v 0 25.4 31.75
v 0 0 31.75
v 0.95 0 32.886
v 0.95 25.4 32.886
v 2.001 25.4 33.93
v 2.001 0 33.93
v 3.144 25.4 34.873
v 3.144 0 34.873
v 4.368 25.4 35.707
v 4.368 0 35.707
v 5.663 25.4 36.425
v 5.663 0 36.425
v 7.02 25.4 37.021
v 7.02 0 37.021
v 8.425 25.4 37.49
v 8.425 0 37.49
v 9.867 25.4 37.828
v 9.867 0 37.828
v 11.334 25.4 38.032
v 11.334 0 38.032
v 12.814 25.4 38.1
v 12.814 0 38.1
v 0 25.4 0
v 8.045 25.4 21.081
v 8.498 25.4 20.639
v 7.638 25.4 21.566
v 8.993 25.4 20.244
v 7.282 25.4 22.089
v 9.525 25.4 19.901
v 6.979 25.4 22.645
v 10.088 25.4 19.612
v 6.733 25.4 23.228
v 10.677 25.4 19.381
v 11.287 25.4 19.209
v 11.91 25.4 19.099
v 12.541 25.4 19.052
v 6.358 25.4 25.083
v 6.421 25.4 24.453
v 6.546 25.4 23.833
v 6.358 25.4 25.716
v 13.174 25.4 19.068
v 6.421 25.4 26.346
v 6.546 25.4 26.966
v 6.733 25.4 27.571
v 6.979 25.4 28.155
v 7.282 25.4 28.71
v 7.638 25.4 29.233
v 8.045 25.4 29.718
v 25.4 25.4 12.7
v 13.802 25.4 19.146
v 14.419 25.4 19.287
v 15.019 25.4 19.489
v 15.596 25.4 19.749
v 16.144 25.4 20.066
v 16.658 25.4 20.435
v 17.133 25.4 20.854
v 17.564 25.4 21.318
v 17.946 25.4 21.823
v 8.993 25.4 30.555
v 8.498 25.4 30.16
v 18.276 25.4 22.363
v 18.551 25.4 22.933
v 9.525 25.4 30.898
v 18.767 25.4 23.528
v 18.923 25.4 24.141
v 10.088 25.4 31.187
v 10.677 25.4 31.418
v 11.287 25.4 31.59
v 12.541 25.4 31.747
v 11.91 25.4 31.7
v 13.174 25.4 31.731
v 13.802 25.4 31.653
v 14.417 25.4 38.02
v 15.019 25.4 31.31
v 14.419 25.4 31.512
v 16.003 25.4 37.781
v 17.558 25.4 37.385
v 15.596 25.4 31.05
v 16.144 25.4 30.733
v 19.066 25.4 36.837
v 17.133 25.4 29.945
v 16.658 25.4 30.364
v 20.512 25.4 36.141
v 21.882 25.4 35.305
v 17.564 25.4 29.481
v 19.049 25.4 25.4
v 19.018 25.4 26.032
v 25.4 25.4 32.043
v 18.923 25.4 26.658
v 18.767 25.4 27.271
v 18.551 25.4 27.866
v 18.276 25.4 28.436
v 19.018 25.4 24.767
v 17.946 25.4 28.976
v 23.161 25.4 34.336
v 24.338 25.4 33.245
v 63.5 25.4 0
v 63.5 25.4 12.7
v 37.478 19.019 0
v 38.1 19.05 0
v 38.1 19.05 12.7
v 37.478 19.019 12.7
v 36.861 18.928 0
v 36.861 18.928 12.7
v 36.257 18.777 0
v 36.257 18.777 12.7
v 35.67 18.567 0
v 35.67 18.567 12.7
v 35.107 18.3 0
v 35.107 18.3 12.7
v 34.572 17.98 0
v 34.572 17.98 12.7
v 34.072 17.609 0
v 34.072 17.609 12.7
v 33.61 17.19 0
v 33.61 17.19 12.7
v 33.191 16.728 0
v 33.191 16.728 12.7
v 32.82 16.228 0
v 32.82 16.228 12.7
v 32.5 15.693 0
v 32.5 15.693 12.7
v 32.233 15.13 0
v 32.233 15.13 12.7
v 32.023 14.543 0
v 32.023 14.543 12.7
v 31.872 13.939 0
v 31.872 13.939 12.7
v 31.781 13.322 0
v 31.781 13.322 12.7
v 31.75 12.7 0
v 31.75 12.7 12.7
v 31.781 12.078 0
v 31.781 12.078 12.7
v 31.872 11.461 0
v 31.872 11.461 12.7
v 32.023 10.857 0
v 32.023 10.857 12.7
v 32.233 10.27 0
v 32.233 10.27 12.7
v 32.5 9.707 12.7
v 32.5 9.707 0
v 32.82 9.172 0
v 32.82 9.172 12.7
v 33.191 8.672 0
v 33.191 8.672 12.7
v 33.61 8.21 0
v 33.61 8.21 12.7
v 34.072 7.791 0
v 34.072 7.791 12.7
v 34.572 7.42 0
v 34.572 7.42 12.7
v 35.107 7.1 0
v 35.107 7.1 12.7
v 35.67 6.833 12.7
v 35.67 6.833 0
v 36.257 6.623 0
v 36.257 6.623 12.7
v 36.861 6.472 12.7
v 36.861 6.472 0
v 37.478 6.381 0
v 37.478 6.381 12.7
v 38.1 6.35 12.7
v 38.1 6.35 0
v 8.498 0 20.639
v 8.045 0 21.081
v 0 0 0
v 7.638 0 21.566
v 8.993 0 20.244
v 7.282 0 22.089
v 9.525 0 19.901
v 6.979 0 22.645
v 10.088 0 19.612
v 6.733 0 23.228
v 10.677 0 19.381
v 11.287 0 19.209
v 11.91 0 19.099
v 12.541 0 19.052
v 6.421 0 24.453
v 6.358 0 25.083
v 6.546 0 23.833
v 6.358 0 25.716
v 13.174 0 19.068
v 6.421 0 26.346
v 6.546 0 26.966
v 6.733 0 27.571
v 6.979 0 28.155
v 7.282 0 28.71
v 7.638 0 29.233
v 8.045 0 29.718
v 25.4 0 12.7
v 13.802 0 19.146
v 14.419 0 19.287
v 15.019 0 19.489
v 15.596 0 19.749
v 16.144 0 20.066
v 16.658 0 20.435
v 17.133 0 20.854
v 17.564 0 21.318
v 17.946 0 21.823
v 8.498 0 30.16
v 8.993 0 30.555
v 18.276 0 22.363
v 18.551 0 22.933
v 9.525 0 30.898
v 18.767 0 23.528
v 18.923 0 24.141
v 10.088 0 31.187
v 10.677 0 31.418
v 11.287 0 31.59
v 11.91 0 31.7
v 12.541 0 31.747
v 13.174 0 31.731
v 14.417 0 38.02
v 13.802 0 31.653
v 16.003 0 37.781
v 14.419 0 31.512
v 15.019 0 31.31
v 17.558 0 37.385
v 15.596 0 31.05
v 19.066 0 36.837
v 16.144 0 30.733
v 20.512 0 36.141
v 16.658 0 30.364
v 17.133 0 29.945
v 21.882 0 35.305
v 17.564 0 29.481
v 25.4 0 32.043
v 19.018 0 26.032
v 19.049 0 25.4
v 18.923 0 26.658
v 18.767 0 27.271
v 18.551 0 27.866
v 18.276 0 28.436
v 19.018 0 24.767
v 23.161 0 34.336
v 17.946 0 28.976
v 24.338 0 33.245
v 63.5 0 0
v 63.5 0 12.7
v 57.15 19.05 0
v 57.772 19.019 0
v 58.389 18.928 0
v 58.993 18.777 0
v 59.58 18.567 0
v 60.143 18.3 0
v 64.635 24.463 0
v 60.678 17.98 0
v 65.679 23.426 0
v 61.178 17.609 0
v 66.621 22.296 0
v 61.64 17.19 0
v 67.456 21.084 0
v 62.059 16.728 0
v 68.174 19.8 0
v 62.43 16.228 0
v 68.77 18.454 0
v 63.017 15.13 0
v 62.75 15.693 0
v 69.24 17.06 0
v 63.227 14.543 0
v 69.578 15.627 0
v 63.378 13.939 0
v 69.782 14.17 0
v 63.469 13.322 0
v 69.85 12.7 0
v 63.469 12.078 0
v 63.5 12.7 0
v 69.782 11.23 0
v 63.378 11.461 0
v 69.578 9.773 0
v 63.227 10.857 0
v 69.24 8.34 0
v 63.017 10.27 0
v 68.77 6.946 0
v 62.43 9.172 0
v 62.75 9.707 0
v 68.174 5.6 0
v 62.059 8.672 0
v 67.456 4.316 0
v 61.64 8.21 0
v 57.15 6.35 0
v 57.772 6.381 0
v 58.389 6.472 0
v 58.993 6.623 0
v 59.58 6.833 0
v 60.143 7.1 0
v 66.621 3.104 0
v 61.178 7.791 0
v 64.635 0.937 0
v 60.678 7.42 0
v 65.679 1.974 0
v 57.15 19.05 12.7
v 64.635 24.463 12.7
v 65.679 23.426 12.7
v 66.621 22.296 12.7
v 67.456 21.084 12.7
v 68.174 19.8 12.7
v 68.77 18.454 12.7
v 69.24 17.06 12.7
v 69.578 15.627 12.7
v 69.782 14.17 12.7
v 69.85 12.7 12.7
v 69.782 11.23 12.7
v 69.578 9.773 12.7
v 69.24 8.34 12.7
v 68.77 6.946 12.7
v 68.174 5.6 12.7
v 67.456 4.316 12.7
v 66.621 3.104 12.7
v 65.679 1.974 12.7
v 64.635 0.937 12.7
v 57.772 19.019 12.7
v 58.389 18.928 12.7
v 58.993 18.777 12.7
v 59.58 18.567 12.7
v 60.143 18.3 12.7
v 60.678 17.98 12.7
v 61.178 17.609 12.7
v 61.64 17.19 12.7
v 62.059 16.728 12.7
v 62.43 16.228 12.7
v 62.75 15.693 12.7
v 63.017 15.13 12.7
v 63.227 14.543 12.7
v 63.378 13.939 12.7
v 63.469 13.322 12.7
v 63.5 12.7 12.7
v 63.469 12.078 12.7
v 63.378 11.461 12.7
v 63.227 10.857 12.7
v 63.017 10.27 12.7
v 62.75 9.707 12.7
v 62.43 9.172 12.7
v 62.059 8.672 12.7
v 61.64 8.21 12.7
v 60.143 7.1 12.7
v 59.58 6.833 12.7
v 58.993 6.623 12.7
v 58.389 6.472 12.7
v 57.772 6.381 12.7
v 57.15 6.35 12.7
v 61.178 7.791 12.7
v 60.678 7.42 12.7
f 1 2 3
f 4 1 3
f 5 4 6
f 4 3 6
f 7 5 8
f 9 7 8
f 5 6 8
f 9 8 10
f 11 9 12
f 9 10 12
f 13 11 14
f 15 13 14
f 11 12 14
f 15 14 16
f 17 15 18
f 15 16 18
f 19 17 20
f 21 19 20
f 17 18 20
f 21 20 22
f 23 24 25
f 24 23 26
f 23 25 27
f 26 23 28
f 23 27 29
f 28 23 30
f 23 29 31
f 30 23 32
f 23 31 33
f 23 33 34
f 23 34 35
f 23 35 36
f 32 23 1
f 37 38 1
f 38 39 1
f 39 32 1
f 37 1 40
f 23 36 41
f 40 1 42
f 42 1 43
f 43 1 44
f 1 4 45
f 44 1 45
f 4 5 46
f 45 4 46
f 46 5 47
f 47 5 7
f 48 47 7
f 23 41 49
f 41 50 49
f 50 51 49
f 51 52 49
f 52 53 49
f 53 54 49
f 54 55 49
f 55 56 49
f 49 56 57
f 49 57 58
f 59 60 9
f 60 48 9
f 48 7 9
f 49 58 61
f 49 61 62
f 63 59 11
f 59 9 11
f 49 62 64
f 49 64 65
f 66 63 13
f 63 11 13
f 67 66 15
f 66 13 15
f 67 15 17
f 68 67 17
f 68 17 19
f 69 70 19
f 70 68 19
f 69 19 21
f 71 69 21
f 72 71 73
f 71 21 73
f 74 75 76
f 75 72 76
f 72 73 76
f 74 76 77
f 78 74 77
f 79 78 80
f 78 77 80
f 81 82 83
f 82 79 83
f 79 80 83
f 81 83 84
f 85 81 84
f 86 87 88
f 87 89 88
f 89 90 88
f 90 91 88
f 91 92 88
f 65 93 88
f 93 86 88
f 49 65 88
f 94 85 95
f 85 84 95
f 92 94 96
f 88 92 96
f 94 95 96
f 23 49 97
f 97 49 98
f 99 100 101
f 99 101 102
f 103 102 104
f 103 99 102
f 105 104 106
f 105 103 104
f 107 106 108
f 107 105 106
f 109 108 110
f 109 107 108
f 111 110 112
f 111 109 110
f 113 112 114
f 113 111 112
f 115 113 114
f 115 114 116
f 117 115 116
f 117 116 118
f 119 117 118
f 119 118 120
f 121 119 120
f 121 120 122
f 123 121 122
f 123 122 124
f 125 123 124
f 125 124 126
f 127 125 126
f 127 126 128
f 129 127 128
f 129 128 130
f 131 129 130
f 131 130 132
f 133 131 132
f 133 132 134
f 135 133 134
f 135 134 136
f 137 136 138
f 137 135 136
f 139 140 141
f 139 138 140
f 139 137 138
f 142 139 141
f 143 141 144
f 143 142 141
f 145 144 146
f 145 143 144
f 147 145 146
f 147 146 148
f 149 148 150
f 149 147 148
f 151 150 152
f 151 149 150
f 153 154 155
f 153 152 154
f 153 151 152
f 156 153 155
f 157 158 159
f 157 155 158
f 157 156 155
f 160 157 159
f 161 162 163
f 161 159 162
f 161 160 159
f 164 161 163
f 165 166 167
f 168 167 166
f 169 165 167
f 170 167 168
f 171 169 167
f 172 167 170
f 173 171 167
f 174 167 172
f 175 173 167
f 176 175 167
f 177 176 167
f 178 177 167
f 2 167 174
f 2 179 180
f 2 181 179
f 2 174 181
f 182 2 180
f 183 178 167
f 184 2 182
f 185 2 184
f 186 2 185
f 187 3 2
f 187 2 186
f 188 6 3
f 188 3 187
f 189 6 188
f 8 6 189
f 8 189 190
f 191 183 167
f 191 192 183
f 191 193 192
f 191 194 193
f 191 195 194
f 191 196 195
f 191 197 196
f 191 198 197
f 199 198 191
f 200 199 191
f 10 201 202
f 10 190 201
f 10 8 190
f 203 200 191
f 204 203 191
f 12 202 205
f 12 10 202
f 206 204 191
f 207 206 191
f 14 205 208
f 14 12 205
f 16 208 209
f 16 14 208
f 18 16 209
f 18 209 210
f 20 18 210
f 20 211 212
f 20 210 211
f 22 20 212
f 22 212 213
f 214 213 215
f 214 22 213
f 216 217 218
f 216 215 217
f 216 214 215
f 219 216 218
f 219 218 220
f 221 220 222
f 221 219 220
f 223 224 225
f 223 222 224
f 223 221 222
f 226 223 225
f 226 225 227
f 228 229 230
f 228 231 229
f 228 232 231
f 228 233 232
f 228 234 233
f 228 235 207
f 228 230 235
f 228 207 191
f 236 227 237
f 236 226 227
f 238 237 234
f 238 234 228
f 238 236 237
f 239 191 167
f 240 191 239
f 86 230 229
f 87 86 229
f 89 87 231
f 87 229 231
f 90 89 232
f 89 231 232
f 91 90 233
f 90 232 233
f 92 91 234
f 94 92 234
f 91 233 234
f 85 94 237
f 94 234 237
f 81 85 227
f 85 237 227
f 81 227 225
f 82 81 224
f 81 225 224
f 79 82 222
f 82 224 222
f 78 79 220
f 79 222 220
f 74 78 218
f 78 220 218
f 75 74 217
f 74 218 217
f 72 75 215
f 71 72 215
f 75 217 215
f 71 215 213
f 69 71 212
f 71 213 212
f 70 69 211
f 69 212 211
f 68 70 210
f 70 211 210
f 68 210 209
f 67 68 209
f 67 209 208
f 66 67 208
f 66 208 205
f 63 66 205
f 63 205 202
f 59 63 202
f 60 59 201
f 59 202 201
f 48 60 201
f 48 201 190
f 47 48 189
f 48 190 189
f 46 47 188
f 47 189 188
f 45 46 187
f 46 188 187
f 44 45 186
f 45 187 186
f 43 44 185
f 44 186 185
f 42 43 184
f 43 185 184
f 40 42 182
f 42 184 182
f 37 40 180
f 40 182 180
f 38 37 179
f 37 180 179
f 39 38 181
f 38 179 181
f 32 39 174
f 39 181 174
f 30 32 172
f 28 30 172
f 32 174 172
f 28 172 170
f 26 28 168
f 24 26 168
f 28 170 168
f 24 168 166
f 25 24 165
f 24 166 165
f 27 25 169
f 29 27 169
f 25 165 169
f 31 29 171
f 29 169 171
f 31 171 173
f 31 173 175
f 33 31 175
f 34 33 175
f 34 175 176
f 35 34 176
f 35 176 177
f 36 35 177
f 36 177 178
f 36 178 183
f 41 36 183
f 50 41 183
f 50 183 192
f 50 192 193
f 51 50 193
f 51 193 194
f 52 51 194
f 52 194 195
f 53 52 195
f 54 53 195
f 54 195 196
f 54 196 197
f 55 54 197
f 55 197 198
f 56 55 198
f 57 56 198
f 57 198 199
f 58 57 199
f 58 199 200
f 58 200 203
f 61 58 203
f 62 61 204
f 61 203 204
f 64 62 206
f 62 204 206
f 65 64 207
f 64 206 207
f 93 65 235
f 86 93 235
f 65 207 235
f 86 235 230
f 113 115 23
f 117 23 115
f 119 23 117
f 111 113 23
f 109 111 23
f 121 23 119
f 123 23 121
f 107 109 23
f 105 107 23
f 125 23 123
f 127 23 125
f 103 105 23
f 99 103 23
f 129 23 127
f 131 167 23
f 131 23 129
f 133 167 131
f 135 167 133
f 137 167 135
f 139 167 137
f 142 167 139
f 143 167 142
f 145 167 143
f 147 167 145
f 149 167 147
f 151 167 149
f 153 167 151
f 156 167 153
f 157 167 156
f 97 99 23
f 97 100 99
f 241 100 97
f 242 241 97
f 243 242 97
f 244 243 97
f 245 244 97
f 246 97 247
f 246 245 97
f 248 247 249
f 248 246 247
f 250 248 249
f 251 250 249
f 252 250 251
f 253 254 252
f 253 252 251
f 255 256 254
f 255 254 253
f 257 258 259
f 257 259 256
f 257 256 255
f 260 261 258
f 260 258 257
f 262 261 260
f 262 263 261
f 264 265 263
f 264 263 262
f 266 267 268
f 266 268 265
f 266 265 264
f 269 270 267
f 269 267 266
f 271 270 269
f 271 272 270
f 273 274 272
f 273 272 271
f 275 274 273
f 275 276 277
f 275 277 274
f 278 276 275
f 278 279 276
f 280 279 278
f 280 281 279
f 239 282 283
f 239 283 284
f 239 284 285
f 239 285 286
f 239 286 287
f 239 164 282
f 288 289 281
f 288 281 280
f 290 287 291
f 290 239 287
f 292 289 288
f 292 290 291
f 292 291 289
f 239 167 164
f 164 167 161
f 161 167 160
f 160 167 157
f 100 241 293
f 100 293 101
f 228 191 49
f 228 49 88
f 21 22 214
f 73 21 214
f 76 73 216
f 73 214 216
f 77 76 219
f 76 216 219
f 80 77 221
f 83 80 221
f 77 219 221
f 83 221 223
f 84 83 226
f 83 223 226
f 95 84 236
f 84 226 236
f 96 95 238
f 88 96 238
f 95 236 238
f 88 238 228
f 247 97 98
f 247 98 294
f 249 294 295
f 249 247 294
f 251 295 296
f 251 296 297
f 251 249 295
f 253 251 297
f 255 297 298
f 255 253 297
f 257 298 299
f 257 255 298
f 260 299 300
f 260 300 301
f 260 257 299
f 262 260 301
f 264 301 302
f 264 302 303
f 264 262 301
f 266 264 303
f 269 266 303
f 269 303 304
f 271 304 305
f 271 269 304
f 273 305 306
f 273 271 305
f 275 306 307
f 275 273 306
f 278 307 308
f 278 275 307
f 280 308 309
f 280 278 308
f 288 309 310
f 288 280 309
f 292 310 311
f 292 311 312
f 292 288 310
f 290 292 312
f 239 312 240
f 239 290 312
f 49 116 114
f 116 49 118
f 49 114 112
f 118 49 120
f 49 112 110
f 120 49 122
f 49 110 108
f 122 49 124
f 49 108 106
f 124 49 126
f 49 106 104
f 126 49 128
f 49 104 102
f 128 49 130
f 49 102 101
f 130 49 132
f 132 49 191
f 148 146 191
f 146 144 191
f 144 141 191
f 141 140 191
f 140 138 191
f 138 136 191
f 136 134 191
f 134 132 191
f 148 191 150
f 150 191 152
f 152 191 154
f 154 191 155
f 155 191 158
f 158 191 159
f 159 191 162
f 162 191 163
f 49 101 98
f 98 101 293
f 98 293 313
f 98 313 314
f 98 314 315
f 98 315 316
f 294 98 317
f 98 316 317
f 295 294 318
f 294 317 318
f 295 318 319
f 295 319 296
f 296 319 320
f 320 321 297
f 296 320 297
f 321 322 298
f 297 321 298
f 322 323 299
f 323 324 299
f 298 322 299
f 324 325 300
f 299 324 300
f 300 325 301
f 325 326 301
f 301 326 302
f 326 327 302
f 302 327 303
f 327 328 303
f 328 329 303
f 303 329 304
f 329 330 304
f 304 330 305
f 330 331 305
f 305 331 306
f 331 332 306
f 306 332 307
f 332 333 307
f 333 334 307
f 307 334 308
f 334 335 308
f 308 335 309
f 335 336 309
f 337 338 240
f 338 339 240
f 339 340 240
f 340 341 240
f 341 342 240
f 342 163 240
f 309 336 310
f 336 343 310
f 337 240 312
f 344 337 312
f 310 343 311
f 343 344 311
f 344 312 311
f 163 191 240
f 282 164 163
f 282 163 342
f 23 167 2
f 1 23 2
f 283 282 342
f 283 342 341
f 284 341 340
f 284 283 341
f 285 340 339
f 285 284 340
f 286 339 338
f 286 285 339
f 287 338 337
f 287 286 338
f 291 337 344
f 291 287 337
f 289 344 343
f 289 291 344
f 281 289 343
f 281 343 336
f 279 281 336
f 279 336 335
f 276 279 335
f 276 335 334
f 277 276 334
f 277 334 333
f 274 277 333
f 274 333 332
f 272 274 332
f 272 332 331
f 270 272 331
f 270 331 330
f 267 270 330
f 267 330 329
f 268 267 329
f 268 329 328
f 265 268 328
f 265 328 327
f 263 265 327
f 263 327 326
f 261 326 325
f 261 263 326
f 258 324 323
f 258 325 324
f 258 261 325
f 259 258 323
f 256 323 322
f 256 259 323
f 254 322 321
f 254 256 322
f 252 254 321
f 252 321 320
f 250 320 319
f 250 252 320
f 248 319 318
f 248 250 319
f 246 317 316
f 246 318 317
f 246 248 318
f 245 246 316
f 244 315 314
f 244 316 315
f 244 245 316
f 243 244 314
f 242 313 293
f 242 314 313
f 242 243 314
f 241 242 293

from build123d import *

# Parameters (mm, degrees)
F0_W      = 69.85
F0_H      = 38.1
F1_DEPTH  = 25.4
F2_W      = 44.45
F2_H      = 25.4
F3_DEPTH  = 25.4
F5_DEPTH  = 25.4
F7_DEPTH  = 25.4
F9_DEPTH  = 25.4
F10_R     = 6.349565
F11_DEPTH = 25.4


with BuildPart() as f1:
    # F0 (on Front) → F1 (new body)
    with BuildSketch(Plane.XZ):
        with Locations((34.925, 19.05)):
            Rectangle(F0_W, F0_H)
    extrude(amount=-F1_DEPTH)

    # F2 (on Front) → F3 (cut)
    with BuildSketch(Plane.XZ):
        with Locations((47.625, 25.4)):
            Rectangle(F2_W, F2_H)
    extrude(amount=-F3_DEPTH, mode=Mode.SUBTRACT)

    # F4 (on Top) → F5 (cut)
    with BuildSketch(Plane.XY):
        with BuildLine():
            ThreePointArc((63.5, 25.4), (68.174032, 19.799516), (69.85, 12.7))
            Line((69.85, 12.7), (69.85, 25.4))
            Line((69.85, 25.4), (63.5, 25.4))
        make_face()
        with BuildLine():
            ThreePointArc((69.85, 12.7), (68.174032, 5.600484), (63.5, 0))
            Line((63.5, 0), (69.85, 0))
            Line((69.85, 0), (69.85, 12.7))
        make_face()
    extrude(amount=F5_DEPTH, mode=Mode.SUBTRACT)

    # F6 (on Front) → F7 (cut)
    with BuildSketch(Plane.XZ):
        with BuildLine():
            ThreePointArc((0, 31.75), (5.663485, 36.425437), (12.814052, 38.1))
            Line((12.814052, 38.1), (0, 38.1))
            Line((0, 38.1), (0, 31.75))
        make_face()
        with BuildLine():
            ThreePointArc((12.814052, 38.1), (19.797928, 36.506847), (25.4, 32.042605))
            Line((25.4, 32.042605), (25.4, 38.1))
            Line((25.4, 38.1), (12.814052, 38.1))
        make_face()
    extrude(amount=-F7_DEPTH, mode=Mode.SUBTRACT)

    # F8 (on Top) → F9 (cut)
    with BuildSketch(Plane.XY):
        with BuildLine():
            Line((57.15, 19.05), (38.1, 19.05))
            ThreePointArc((38.1, 19.05), (31.75, 12.7), (38.1, 6.35))
            Line((38.1, 6.35), (57.15, 6.35))
            ThreePointArc((57.15, 6.35), (63.5, 12.7), (57.15, 19.05))
        make_face()
    extrude(amount=F9_DEPTH, mode=Mode.SUBTRACT)

    # F10 (on Front) → F11 (cut)
    with BuildSketch(Plane.XZ):
        with Locations((12.699565, 25.399565)):
            Circle(F10_R)
    extrude(amount=-F11_DEPTH, mode=Mode.SUBTRACT)


solid = f1.part
